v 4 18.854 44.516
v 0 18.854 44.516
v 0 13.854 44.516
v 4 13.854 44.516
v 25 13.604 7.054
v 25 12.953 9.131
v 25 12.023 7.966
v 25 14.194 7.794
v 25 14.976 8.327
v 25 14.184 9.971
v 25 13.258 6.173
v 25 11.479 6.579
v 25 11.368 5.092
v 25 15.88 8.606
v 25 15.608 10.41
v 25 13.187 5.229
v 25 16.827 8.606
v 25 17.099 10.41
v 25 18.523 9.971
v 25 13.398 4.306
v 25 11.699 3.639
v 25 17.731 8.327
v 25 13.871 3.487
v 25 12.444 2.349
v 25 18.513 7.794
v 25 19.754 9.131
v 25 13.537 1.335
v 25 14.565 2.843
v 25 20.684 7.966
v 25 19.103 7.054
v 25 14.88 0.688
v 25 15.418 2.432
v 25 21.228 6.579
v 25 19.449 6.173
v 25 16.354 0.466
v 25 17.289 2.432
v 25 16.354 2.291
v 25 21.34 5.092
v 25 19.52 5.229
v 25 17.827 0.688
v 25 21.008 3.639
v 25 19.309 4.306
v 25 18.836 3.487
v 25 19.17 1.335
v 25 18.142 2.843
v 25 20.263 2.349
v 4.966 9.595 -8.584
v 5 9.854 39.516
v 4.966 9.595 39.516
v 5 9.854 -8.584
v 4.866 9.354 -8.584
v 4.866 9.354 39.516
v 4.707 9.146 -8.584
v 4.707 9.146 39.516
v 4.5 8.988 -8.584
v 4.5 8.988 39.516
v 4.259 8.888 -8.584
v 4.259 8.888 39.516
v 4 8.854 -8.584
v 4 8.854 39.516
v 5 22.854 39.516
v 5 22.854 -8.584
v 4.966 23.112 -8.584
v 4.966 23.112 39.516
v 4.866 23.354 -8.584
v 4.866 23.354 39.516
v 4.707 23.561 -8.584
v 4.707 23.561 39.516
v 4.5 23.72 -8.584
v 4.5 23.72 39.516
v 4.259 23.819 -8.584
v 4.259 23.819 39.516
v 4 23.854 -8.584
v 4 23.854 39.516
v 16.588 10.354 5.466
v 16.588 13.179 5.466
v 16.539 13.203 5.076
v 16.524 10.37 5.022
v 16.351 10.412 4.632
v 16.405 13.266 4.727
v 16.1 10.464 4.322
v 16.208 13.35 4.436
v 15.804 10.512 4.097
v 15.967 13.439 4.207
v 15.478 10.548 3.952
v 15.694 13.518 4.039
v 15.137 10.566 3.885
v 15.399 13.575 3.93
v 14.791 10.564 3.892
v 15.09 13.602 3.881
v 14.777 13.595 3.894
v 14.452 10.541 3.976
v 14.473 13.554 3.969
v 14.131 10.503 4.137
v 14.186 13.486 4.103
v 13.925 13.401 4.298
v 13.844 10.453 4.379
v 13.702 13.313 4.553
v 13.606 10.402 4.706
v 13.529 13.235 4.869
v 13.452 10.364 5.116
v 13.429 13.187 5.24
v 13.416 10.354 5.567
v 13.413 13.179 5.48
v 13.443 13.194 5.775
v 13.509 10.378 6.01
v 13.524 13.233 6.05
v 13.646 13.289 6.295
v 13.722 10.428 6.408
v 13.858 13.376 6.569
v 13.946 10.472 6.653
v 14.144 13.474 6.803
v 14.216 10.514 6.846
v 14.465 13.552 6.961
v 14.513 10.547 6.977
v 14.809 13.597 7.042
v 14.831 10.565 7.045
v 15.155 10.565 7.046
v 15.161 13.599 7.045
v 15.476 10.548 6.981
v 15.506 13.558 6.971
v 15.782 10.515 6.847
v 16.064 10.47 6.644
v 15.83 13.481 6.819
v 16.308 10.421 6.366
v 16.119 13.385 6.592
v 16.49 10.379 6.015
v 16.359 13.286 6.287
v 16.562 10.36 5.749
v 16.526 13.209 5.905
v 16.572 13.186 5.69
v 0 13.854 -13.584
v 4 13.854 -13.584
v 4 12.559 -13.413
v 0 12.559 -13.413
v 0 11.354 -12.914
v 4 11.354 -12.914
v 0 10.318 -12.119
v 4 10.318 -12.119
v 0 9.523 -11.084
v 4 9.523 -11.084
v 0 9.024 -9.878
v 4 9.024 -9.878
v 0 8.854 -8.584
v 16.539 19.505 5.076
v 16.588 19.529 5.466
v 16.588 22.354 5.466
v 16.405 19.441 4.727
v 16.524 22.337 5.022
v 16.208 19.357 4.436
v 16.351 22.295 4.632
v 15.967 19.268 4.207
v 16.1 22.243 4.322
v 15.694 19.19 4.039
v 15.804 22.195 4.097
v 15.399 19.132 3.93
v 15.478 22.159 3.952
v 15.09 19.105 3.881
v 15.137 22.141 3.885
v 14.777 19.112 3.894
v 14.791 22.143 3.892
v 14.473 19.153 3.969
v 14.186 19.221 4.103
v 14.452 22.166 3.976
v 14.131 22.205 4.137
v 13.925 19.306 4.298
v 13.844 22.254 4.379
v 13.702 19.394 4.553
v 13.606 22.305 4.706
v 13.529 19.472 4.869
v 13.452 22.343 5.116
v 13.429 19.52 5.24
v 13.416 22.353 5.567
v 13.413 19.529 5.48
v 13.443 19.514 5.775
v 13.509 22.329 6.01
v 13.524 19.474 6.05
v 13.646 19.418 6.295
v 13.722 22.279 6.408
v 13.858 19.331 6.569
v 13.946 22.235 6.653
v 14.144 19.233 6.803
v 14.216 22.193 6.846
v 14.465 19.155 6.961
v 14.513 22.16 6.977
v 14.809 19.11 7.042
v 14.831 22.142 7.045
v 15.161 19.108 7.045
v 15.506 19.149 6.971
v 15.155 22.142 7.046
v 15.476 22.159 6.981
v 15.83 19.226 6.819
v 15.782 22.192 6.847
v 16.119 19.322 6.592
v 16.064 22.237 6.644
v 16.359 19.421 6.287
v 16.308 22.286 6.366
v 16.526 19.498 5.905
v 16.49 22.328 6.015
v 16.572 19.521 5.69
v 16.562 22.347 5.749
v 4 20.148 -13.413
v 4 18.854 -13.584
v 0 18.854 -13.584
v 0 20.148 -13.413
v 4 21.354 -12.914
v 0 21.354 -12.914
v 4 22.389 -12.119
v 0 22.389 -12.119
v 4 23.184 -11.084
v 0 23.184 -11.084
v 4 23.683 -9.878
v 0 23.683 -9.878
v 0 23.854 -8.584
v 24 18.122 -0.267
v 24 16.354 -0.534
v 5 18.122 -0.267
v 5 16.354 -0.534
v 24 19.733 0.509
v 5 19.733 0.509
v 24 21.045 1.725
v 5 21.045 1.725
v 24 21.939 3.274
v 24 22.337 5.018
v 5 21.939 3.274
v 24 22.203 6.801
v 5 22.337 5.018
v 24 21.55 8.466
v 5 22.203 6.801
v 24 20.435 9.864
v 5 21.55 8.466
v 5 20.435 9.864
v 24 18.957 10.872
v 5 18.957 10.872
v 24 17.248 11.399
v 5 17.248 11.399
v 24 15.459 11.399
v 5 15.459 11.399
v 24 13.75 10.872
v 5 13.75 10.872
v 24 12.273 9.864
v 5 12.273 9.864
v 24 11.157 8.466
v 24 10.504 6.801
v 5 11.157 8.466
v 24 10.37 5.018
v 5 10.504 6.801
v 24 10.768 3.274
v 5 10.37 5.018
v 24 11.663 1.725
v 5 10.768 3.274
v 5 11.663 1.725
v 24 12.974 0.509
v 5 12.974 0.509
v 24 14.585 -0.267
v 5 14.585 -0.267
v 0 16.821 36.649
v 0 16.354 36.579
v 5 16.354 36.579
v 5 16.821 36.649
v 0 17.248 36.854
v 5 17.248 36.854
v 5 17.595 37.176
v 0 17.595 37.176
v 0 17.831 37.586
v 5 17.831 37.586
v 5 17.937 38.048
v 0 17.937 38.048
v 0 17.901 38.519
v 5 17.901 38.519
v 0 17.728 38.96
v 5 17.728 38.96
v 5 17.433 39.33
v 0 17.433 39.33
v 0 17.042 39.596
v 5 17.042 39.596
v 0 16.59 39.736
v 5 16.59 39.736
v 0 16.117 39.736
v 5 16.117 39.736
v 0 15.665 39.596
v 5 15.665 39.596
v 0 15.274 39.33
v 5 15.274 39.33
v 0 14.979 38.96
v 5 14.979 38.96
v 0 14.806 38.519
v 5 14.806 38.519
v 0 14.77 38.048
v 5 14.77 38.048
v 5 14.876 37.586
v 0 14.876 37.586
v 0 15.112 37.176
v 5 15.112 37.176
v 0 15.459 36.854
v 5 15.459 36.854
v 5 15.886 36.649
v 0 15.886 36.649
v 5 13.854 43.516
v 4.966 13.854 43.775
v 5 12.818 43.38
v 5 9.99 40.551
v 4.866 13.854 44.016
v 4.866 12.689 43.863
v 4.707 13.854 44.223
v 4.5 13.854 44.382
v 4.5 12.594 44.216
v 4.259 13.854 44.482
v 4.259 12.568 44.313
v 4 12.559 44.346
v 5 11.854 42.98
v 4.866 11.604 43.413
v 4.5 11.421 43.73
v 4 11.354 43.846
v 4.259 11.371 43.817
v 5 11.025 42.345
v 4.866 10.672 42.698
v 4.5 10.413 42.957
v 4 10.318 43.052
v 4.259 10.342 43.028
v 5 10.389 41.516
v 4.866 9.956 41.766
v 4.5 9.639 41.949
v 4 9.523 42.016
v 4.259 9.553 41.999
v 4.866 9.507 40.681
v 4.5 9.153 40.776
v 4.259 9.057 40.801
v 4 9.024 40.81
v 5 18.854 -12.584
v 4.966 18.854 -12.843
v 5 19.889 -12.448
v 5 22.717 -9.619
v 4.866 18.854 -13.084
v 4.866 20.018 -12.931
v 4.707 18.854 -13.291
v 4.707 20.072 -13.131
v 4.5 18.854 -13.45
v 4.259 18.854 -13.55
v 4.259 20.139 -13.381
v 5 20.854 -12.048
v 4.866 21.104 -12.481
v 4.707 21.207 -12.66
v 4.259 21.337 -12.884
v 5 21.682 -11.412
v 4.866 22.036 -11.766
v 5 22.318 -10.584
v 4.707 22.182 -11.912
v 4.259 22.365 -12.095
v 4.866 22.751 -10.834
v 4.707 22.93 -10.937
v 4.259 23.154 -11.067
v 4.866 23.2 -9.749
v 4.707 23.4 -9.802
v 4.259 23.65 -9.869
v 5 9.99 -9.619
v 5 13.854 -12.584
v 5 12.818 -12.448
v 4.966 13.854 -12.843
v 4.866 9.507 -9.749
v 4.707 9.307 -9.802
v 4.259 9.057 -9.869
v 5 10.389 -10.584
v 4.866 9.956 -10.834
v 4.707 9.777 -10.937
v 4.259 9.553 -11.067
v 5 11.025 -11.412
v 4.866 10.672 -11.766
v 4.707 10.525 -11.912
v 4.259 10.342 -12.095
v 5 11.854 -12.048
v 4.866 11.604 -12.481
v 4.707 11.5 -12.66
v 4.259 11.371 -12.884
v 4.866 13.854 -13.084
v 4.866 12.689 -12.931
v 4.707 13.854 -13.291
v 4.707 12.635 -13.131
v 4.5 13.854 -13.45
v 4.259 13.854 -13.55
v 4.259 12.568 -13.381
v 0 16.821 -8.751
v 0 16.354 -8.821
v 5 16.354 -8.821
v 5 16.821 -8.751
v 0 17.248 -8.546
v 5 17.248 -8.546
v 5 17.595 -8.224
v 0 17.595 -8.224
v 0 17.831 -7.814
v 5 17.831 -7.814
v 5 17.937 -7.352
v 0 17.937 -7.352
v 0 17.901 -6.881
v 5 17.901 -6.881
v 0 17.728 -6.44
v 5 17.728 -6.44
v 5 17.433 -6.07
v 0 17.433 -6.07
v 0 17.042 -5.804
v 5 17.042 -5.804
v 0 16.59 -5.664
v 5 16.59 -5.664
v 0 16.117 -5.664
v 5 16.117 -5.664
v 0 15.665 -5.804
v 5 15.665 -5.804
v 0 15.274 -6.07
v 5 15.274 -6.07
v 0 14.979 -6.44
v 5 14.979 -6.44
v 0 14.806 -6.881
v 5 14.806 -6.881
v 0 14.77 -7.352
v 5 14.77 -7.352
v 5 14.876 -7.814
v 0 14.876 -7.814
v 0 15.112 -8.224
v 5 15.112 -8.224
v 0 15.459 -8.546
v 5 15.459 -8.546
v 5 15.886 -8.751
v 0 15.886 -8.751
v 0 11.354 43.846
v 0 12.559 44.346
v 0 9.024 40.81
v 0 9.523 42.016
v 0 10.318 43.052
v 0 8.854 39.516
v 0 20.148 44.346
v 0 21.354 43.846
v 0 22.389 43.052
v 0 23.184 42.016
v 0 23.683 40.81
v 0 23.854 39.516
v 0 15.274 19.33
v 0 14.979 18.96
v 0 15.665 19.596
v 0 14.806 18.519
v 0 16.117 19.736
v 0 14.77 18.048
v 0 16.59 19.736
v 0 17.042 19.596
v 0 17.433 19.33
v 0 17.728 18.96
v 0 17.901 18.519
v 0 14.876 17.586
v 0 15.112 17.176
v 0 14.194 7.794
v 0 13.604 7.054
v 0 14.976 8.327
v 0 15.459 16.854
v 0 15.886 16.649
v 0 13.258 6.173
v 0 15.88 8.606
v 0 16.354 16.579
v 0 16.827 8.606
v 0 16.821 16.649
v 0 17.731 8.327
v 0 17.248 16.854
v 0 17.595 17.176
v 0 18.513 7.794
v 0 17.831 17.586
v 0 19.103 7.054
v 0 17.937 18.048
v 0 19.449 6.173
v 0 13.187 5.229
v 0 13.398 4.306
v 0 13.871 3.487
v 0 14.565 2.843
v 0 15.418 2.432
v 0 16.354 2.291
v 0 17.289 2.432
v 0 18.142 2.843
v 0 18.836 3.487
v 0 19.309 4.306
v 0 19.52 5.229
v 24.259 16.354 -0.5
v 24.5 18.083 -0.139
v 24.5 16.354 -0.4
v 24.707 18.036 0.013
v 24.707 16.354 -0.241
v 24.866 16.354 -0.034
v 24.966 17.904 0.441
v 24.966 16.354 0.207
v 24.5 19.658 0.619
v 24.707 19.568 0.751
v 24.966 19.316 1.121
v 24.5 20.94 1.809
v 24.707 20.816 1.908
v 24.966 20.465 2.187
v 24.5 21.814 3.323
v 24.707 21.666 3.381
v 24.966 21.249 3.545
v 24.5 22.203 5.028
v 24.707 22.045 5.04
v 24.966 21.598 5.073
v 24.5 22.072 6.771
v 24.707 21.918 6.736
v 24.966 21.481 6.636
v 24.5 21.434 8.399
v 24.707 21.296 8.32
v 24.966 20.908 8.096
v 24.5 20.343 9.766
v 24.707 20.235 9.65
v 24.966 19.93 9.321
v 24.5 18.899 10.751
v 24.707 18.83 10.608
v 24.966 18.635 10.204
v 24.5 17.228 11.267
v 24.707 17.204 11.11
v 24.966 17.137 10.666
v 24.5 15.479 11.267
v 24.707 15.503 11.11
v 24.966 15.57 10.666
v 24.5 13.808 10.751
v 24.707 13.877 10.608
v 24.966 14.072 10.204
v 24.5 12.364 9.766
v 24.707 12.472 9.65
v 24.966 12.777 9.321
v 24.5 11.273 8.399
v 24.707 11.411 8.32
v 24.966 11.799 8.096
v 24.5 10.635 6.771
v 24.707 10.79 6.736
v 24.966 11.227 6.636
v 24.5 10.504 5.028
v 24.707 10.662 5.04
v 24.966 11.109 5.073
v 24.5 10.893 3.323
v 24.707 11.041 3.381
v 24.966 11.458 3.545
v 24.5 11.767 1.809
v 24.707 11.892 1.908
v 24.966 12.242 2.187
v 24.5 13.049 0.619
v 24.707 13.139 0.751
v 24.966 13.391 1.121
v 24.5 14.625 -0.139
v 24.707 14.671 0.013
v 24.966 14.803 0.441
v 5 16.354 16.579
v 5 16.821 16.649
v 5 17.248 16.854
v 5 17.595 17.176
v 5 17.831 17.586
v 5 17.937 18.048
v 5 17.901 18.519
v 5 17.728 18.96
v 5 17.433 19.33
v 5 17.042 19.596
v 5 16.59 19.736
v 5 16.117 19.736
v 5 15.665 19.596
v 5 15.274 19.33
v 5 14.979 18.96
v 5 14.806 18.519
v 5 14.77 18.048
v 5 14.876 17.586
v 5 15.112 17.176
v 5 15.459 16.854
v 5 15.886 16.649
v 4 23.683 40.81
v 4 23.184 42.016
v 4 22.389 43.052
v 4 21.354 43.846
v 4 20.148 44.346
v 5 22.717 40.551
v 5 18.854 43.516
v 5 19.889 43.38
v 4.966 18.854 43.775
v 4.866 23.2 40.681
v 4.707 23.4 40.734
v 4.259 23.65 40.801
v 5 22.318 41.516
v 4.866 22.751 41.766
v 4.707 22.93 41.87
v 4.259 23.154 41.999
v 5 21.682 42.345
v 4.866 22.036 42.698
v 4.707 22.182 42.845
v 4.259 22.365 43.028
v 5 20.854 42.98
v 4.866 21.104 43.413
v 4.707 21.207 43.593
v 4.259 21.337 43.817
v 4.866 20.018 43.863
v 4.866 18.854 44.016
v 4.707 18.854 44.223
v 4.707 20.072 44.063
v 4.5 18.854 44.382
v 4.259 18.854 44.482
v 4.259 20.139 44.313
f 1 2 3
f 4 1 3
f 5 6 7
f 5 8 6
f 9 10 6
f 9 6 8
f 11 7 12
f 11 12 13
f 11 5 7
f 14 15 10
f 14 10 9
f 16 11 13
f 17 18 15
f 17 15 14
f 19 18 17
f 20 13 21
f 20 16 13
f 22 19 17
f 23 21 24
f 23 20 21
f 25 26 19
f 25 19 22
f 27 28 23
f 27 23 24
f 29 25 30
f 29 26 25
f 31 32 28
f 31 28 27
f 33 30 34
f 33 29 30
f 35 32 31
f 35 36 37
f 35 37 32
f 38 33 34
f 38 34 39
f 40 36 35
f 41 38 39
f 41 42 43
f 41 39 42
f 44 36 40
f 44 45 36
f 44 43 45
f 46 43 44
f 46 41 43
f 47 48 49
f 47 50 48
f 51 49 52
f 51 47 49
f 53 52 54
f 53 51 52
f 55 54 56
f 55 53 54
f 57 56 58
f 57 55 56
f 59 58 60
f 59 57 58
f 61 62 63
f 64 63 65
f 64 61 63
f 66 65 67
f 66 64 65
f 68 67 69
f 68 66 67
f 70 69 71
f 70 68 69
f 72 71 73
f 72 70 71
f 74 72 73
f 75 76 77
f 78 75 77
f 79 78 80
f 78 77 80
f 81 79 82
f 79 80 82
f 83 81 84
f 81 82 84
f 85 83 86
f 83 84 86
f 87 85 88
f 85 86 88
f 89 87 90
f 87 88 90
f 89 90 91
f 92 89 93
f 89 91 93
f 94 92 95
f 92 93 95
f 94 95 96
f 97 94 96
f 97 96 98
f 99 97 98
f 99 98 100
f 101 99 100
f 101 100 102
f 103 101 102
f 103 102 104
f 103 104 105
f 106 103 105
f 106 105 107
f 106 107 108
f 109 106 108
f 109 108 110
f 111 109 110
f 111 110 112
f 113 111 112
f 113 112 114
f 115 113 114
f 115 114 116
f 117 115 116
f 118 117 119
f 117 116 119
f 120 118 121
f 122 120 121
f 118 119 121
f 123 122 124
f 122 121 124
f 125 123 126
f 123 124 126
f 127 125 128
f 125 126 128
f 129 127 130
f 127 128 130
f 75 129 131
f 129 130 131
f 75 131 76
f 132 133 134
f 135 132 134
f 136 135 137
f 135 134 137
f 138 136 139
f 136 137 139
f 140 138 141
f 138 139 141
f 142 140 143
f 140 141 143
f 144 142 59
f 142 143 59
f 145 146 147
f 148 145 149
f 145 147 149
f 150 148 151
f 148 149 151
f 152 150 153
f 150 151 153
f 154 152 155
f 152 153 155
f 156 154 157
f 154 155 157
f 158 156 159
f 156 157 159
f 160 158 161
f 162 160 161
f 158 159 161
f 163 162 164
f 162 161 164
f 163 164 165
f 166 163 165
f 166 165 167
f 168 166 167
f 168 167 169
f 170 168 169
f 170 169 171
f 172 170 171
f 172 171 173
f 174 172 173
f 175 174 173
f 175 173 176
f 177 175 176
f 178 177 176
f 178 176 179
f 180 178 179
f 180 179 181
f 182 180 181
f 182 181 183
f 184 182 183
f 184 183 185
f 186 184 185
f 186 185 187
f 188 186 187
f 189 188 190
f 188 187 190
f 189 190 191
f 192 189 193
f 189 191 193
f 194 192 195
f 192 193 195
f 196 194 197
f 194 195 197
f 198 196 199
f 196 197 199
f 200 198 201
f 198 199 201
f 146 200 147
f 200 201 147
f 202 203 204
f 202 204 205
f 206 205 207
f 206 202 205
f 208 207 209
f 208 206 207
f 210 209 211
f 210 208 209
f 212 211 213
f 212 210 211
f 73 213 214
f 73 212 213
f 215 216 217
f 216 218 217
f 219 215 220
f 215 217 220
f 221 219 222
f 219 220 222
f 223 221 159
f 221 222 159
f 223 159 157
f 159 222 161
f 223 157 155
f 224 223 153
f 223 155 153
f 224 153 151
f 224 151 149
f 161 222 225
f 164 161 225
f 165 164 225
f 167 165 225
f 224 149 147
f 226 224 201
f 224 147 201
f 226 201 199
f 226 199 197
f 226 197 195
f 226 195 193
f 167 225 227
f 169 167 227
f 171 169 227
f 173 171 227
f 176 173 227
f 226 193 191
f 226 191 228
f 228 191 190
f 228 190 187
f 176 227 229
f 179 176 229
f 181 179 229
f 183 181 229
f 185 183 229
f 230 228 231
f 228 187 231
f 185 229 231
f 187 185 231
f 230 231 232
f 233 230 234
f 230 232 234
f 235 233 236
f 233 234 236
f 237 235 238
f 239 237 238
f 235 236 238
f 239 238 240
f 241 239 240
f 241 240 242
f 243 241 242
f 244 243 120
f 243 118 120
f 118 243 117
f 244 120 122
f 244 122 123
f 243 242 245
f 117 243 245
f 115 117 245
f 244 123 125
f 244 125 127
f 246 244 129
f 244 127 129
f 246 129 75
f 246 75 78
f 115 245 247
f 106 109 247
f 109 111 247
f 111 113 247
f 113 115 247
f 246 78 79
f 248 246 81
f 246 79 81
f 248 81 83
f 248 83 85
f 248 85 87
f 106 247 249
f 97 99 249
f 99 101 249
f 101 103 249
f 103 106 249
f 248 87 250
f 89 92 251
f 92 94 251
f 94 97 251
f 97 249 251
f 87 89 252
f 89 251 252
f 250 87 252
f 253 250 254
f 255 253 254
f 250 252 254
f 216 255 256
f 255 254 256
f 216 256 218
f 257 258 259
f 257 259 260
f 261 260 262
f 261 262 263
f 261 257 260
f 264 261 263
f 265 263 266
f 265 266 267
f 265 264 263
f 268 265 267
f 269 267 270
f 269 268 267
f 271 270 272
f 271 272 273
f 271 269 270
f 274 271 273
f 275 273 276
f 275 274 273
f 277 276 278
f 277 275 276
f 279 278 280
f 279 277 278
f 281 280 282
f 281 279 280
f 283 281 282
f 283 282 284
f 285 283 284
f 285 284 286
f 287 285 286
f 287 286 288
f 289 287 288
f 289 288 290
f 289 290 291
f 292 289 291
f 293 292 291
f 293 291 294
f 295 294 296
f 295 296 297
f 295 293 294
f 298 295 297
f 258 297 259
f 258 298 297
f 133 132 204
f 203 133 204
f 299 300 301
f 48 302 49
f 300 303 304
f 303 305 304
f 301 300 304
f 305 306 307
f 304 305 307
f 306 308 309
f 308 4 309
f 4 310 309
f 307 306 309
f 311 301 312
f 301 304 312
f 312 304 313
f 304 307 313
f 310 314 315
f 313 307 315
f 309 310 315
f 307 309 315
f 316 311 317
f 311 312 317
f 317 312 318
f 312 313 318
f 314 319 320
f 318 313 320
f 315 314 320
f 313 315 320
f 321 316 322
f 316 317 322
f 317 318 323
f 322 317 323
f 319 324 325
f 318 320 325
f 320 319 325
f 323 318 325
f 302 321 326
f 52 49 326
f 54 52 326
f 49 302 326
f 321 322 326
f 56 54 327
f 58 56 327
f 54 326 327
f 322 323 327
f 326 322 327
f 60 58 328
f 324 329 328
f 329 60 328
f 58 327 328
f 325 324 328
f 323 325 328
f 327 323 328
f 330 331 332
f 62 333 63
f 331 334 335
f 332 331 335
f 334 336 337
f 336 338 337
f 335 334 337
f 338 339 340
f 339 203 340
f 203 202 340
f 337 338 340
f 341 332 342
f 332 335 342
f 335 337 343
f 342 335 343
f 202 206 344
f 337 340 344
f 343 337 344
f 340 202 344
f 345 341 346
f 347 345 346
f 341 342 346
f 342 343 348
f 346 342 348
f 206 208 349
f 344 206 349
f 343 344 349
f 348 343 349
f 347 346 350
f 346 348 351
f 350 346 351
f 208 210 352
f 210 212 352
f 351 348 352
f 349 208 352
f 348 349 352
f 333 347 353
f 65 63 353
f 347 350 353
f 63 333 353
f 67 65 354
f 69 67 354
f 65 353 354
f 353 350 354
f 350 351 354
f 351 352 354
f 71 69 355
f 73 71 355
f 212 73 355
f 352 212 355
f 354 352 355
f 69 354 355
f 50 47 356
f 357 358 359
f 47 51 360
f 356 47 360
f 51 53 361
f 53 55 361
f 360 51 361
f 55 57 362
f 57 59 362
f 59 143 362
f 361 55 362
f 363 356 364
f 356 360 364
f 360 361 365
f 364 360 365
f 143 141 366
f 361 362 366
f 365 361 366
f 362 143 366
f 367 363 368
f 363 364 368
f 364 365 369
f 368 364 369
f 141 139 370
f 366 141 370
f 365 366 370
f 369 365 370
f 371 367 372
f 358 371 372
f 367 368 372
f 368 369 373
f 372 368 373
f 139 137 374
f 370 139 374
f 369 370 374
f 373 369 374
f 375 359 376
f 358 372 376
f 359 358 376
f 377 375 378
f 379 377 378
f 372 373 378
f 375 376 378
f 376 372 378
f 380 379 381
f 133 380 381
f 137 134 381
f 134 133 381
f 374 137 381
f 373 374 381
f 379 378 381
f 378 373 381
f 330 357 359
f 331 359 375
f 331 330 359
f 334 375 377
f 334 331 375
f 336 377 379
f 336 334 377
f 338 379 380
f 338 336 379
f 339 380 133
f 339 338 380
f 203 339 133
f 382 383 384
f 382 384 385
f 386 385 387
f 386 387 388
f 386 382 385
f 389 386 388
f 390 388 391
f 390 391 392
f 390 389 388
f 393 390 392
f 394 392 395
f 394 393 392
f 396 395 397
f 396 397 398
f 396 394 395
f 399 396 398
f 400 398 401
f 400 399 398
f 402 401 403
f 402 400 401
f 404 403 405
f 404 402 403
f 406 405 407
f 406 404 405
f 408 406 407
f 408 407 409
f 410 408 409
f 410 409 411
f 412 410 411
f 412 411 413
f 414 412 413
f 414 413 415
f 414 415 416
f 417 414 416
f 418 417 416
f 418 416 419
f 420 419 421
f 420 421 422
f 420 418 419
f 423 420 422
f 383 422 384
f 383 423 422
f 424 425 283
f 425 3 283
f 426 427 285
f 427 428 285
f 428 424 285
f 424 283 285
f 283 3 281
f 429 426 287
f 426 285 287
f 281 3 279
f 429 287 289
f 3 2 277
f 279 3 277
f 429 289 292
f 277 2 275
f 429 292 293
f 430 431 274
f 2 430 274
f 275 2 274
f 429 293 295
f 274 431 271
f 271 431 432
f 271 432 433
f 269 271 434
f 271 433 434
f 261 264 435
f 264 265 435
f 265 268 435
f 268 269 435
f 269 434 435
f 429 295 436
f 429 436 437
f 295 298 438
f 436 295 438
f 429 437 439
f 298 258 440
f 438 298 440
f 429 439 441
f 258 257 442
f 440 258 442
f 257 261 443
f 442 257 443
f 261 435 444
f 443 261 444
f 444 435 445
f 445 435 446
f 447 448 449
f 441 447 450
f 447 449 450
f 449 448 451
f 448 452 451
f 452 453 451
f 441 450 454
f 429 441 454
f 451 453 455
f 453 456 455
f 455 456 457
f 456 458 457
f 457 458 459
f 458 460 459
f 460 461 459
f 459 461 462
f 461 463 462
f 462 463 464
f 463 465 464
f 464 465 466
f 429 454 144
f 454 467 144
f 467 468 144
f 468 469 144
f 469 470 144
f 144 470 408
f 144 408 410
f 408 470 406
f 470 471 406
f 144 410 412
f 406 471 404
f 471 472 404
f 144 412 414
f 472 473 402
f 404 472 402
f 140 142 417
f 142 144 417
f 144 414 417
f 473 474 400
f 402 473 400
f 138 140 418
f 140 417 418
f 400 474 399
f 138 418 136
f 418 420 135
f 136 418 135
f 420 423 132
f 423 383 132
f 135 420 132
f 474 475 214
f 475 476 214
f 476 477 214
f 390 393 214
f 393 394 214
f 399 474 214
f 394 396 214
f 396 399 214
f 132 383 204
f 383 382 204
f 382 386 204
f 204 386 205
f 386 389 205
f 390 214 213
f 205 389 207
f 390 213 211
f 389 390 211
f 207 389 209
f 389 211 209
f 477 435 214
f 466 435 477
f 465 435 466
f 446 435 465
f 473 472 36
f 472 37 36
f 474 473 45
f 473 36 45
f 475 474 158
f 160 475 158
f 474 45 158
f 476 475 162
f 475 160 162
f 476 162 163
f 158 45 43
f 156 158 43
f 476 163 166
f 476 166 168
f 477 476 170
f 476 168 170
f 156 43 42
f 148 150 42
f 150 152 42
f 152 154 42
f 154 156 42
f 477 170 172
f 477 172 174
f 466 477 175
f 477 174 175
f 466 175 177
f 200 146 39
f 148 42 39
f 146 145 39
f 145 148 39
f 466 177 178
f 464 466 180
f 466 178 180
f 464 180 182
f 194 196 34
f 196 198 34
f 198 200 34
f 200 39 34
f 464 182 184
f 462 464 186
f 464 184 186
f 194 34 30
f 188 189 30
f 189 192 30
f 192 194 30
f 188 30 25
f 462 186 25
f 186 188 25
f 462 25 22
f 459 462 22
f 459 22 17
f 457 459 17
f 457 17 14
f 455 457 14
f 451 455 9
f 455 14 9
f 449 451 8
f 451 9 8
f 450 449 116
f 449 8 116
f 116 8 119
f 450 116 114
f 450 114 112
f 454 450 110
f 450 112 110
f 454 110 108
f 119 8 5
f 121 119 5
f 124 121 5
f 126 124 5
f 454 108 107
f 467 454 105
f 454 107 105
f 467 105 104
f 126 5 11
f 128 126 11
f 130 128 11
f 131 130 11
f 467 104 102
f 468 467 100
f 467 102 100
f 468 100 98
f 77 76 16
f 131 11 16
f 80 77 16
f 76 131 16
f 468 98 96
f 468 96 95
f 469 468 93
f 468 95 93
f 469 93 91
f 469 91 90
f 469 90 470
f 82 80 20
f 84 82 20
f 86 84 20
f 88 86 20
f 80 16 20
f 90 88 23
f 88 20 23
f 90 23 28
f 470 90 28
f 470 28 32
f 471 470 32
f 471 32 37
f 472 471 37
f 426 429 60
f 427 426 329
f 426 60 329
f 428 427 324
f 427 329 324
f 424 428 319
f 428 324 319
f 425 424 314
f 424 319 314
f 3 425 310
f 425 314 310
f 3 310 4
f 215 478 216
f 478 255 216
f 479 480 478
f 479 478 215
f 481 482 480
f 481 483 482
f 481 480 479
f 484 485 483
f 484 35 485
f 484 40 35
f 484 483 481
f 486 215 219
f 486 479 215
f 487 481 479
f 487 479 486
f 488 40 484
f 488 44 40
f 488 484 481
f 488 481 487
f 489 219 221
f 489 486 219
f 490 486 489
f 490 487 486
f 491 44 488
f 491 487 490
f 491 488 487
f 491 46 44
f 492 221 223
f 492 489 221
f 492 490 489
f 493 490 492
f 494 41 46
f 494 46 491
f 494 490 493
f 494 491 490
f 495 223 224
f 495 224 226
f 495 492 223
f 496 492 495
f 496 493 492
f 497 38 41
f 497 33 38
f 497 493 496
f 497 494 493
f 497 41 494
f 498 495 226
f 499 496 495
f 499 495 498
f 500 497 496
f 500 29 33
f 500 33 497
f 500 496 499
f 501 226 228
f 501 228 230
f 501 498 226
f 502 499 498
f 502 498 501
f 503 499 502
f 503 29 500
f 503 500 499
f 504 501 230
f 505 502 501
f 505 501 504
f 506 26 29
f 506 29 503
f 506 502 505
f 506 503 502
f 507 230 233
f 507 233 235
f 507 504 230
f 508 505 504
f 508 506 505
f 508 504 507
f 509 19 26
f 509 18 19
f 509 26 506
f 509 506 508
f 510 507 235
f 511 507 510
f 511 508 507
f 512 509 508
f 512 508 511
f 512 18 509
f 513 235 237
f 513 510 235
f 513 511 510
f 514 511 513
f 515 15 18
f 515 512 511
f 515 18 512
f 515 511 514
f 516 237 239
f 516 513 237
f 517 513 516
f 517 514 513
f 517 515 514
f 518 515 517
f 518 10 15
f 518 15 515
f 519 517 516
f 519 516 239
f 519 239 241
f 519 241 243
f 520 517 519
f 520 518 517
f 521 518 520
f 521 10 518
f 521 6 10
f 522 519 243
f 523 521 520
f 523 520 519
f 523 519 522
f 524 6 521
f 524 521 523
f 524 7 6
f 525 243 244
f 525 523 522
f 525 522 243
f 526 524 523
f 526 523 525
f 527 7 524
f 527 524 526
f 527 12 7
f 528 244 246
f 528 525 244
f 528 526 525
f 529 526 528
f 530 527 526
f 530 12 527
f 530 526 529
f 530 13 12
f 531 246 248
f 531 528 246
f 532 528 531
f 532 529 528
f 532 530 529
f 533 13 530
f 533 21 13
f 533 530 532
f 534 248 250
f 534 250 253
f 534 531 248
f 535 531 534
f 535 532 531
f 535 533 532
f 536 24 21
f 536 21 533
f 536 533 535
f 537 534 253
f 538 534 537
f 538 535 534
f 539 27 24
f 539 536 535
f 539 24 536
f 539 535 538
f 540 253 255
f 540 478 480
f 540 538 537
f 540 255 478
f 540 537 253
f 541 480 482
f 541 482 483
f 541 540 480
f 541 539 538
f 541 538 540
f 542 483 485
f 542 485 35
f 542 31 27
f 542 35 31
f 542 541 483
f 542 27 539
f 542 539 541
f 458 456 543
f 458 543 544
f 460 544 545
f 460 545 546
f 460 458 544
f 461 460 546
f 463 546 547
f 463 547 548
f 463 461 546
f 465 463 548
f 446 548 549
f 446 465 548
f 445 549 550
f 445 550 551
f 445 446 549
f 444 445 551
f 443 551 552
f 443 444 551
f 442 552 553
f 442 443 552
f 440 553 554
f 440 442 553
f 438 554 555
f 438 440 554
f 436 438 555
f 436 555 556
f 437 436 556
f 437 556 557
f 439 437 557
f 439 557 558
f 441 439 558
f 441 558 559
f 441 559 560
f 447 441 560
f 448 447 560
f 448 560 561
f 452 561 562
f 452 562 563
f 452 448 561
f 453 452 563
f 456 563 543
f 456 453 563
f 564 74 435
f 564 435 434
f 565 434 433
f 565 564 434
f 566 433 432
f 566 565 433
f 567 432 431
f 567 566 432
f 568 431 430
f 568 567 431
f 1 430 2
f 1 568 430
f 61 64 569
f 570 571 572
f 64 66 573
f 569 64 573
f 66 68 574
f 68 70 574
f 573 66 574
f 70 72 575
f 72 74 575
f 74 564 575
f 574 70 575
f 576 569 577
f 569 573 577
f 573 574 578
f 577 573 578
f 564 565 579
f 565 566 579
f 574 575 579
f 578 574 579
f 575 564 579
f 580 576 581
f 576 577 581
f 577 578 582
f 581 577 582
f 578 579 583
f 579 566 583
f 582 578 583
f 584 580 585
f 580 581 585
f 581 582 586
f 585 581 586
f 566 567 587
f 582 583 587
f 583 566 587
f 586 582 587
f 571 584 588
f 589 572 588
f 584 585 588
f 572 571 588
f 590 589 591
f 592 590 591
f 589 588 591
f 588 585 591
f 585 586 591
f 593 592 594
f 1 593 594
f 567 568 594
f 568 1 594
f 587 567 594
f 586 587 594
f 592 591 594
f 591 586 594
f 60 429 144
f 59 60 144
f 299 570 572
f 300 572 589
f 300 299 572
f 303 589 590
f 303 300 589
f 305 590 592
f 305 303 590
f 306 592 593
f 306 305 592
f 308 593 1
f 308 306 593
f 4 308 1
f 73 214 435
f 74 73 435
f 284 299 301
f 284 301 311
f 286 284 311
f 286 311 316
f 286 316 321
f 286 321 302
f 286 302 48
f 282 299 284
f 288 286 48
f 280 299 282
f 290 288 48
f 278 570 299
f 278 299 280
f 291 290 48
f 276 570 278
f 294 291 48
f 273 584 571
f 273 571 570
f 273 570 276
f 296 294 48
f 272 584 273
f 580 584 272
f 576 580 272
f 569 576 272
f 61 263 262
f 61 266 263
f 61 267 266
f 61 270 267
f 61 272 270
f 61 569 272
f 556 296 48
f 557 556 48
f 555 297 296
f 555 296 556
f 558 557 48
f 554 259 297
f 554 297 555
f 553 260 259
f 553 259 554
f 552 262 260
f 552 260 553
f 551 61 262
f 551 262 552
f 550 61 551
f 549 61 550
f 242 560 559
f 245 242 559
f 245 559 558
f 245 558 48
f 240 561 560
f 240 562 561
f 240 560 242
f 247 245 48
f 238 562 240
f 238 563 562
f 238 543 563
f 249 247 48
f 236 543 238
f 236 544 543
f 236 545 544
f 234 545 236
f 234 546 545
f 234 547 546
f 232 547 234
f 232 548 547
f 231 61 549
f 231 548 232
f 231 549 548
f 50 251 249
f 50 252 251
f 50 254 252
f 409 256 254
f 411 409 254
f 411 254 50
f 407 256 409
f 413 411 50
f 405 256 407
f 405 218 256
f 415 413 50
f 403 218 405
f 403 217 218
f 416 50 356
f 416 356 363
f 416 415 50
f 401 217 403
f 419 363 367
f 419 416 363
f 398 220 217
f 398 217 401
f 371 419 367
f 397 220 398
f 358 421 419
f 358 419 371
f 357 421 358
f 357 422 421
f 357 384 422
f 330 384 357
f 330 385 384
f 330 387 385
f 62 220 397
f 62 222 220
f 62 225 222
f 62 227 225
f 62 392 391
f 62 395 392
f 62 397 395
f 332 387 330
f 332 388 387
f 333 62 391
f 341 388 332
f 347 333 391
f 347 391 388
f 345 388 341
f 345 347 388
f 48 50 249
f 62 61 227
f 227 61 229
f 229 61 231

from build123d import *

# Parameters (mm, degrees)
SKETCH1_R           = 1.5875
BOSS_EXTRUDE1_DEPTH = 5
SKETCH2_R           = 6
SKETCH2_R_2         = 3.175
BOSS_EXTRUDE2_DEPTH = 20
FILLET1_R           = 5
FILLET2_R           = 1
SKETCH3_R           = 1.5875
CUT_EXTRUDE1_DEPTH  = 16
FILLET3_R           = 1
SKETCH4_R           = 3.175
CUT_EXTRUDE2_DEPTH  = 6


with BuildPart() as part:
    # Sketch1 → Boss-Extrude1 (new body)
    with BuildSketch(Plane(origin=(0, 0, 0), x_dir=(0, 0, -1), z_dir=(1, 0, 0))):
        Polygon((-24.516144589, 8.853546087), (13.583855411, 8.853546087), (13.583855411, 23.853546087), (-24.516144589, 23.853546087), (-44.516144589, 23.853546087), (-44.516144589, 8.853546087), align=None)
        with Locations((-18.166144589, 16.353546087)):
            Circle(SKETCH1_R, mode=Mode.SUBTRACT)
        with Locations((7.233855411, 16.353546087)):
            Circle(SKETCH1_R, mode=Mode.SUBTRACT)
        with Locations((-38.166144589, 16.353546087)):
            Circle(SKETCH1_R, mode=Mode.SUBTRACT)
    extrude(amount=BOSS_EXTRUDE1_DEPTH)

    # Sketch2 → Boss-Extrude2 (add)
    with BuildSketch(Plane(origin=(5, 0, 0), x_dir=(0, 0, -1), z_dir=(1, 0, 0))):
        with Locations((-5.466144589, 16.353546087)):
            Circle(SKETCH2_R)
        with Locations((-5.466144589, 16.353546087)):
            Circle(SKETCH2_R_2, mode=Mode.SUBTRACT)
    extrude(amount=BOSS_EXTRUDE2_DEPTH)

    # Fillet1
    fillet1_edges = [part.edges().sort_by_distance(p)[0] for p in [
        (2.5, 8.853546087, 44.516144589),
        (2.5, 23.853546087, 44.516144589),
        (2.5, 23.853546087, -13.583855411),
        (2.5, 8.853546087, -13.583855411),
    ]]
    fillet(fillet1_edges, radius=FILLET1_R)

    # Fillet2
    fillet2_edges = [part.edges().sort_by_distance(p)[0] for p in [
        (25, 16.353546087, 11.466144589),
    ]]
    fillet(fillet2_edges, radius=FILLET2_R)

    # Sketch3 → Cut-Extrude1 (cut, through all)
    with BuildSketch(Plane(origin=(0, 23.853546087, 0), x_dir=(1, 0, 0), z_dir=(0, 1, 0))):
        with Locations((15, -5.466144589)):
            Circle(SKETCH3_R)
    extrude(amount=-CUT_EXTRUDE1_DEPTH, mode=Mode.SUBTRACT)

    # Fillet3
    fillet3_edges = [part.edges().sort_by_distance(p)[0] for p in [
        (5, 8.853546087, 15.466144589),
        (5, 16.353546087, 44.516144589),
        (5, 16.353546087, -13.583855411),
        (5, 23.853546087, 15.466144589),
        (5, 22.389079993, -12.119389316),
        (5, 10.318012181, -12.119389316),
        (5, 22.389079993, 43.051678495),
        (5, 10.318012181, 43.051678495),
    ]]
    fillet(fillet3_edges, radius=FILLET3_R)

    # Sketch4 → Cut-Extrude2 (cut, through all)
    with BuildSketch(Plane(origin=(5, 0, 0), x_dir=(0, 0, -1), z_dir=(1, 0, 0))):
        with Locations((-5.466144589, 16.353546087)):
            Circle(SKETCH4_R)
    extrude(amount=-CUT_EXTRUDE2_DEPTH, mode=Mode.SUBTRACT)


solid = part.part
